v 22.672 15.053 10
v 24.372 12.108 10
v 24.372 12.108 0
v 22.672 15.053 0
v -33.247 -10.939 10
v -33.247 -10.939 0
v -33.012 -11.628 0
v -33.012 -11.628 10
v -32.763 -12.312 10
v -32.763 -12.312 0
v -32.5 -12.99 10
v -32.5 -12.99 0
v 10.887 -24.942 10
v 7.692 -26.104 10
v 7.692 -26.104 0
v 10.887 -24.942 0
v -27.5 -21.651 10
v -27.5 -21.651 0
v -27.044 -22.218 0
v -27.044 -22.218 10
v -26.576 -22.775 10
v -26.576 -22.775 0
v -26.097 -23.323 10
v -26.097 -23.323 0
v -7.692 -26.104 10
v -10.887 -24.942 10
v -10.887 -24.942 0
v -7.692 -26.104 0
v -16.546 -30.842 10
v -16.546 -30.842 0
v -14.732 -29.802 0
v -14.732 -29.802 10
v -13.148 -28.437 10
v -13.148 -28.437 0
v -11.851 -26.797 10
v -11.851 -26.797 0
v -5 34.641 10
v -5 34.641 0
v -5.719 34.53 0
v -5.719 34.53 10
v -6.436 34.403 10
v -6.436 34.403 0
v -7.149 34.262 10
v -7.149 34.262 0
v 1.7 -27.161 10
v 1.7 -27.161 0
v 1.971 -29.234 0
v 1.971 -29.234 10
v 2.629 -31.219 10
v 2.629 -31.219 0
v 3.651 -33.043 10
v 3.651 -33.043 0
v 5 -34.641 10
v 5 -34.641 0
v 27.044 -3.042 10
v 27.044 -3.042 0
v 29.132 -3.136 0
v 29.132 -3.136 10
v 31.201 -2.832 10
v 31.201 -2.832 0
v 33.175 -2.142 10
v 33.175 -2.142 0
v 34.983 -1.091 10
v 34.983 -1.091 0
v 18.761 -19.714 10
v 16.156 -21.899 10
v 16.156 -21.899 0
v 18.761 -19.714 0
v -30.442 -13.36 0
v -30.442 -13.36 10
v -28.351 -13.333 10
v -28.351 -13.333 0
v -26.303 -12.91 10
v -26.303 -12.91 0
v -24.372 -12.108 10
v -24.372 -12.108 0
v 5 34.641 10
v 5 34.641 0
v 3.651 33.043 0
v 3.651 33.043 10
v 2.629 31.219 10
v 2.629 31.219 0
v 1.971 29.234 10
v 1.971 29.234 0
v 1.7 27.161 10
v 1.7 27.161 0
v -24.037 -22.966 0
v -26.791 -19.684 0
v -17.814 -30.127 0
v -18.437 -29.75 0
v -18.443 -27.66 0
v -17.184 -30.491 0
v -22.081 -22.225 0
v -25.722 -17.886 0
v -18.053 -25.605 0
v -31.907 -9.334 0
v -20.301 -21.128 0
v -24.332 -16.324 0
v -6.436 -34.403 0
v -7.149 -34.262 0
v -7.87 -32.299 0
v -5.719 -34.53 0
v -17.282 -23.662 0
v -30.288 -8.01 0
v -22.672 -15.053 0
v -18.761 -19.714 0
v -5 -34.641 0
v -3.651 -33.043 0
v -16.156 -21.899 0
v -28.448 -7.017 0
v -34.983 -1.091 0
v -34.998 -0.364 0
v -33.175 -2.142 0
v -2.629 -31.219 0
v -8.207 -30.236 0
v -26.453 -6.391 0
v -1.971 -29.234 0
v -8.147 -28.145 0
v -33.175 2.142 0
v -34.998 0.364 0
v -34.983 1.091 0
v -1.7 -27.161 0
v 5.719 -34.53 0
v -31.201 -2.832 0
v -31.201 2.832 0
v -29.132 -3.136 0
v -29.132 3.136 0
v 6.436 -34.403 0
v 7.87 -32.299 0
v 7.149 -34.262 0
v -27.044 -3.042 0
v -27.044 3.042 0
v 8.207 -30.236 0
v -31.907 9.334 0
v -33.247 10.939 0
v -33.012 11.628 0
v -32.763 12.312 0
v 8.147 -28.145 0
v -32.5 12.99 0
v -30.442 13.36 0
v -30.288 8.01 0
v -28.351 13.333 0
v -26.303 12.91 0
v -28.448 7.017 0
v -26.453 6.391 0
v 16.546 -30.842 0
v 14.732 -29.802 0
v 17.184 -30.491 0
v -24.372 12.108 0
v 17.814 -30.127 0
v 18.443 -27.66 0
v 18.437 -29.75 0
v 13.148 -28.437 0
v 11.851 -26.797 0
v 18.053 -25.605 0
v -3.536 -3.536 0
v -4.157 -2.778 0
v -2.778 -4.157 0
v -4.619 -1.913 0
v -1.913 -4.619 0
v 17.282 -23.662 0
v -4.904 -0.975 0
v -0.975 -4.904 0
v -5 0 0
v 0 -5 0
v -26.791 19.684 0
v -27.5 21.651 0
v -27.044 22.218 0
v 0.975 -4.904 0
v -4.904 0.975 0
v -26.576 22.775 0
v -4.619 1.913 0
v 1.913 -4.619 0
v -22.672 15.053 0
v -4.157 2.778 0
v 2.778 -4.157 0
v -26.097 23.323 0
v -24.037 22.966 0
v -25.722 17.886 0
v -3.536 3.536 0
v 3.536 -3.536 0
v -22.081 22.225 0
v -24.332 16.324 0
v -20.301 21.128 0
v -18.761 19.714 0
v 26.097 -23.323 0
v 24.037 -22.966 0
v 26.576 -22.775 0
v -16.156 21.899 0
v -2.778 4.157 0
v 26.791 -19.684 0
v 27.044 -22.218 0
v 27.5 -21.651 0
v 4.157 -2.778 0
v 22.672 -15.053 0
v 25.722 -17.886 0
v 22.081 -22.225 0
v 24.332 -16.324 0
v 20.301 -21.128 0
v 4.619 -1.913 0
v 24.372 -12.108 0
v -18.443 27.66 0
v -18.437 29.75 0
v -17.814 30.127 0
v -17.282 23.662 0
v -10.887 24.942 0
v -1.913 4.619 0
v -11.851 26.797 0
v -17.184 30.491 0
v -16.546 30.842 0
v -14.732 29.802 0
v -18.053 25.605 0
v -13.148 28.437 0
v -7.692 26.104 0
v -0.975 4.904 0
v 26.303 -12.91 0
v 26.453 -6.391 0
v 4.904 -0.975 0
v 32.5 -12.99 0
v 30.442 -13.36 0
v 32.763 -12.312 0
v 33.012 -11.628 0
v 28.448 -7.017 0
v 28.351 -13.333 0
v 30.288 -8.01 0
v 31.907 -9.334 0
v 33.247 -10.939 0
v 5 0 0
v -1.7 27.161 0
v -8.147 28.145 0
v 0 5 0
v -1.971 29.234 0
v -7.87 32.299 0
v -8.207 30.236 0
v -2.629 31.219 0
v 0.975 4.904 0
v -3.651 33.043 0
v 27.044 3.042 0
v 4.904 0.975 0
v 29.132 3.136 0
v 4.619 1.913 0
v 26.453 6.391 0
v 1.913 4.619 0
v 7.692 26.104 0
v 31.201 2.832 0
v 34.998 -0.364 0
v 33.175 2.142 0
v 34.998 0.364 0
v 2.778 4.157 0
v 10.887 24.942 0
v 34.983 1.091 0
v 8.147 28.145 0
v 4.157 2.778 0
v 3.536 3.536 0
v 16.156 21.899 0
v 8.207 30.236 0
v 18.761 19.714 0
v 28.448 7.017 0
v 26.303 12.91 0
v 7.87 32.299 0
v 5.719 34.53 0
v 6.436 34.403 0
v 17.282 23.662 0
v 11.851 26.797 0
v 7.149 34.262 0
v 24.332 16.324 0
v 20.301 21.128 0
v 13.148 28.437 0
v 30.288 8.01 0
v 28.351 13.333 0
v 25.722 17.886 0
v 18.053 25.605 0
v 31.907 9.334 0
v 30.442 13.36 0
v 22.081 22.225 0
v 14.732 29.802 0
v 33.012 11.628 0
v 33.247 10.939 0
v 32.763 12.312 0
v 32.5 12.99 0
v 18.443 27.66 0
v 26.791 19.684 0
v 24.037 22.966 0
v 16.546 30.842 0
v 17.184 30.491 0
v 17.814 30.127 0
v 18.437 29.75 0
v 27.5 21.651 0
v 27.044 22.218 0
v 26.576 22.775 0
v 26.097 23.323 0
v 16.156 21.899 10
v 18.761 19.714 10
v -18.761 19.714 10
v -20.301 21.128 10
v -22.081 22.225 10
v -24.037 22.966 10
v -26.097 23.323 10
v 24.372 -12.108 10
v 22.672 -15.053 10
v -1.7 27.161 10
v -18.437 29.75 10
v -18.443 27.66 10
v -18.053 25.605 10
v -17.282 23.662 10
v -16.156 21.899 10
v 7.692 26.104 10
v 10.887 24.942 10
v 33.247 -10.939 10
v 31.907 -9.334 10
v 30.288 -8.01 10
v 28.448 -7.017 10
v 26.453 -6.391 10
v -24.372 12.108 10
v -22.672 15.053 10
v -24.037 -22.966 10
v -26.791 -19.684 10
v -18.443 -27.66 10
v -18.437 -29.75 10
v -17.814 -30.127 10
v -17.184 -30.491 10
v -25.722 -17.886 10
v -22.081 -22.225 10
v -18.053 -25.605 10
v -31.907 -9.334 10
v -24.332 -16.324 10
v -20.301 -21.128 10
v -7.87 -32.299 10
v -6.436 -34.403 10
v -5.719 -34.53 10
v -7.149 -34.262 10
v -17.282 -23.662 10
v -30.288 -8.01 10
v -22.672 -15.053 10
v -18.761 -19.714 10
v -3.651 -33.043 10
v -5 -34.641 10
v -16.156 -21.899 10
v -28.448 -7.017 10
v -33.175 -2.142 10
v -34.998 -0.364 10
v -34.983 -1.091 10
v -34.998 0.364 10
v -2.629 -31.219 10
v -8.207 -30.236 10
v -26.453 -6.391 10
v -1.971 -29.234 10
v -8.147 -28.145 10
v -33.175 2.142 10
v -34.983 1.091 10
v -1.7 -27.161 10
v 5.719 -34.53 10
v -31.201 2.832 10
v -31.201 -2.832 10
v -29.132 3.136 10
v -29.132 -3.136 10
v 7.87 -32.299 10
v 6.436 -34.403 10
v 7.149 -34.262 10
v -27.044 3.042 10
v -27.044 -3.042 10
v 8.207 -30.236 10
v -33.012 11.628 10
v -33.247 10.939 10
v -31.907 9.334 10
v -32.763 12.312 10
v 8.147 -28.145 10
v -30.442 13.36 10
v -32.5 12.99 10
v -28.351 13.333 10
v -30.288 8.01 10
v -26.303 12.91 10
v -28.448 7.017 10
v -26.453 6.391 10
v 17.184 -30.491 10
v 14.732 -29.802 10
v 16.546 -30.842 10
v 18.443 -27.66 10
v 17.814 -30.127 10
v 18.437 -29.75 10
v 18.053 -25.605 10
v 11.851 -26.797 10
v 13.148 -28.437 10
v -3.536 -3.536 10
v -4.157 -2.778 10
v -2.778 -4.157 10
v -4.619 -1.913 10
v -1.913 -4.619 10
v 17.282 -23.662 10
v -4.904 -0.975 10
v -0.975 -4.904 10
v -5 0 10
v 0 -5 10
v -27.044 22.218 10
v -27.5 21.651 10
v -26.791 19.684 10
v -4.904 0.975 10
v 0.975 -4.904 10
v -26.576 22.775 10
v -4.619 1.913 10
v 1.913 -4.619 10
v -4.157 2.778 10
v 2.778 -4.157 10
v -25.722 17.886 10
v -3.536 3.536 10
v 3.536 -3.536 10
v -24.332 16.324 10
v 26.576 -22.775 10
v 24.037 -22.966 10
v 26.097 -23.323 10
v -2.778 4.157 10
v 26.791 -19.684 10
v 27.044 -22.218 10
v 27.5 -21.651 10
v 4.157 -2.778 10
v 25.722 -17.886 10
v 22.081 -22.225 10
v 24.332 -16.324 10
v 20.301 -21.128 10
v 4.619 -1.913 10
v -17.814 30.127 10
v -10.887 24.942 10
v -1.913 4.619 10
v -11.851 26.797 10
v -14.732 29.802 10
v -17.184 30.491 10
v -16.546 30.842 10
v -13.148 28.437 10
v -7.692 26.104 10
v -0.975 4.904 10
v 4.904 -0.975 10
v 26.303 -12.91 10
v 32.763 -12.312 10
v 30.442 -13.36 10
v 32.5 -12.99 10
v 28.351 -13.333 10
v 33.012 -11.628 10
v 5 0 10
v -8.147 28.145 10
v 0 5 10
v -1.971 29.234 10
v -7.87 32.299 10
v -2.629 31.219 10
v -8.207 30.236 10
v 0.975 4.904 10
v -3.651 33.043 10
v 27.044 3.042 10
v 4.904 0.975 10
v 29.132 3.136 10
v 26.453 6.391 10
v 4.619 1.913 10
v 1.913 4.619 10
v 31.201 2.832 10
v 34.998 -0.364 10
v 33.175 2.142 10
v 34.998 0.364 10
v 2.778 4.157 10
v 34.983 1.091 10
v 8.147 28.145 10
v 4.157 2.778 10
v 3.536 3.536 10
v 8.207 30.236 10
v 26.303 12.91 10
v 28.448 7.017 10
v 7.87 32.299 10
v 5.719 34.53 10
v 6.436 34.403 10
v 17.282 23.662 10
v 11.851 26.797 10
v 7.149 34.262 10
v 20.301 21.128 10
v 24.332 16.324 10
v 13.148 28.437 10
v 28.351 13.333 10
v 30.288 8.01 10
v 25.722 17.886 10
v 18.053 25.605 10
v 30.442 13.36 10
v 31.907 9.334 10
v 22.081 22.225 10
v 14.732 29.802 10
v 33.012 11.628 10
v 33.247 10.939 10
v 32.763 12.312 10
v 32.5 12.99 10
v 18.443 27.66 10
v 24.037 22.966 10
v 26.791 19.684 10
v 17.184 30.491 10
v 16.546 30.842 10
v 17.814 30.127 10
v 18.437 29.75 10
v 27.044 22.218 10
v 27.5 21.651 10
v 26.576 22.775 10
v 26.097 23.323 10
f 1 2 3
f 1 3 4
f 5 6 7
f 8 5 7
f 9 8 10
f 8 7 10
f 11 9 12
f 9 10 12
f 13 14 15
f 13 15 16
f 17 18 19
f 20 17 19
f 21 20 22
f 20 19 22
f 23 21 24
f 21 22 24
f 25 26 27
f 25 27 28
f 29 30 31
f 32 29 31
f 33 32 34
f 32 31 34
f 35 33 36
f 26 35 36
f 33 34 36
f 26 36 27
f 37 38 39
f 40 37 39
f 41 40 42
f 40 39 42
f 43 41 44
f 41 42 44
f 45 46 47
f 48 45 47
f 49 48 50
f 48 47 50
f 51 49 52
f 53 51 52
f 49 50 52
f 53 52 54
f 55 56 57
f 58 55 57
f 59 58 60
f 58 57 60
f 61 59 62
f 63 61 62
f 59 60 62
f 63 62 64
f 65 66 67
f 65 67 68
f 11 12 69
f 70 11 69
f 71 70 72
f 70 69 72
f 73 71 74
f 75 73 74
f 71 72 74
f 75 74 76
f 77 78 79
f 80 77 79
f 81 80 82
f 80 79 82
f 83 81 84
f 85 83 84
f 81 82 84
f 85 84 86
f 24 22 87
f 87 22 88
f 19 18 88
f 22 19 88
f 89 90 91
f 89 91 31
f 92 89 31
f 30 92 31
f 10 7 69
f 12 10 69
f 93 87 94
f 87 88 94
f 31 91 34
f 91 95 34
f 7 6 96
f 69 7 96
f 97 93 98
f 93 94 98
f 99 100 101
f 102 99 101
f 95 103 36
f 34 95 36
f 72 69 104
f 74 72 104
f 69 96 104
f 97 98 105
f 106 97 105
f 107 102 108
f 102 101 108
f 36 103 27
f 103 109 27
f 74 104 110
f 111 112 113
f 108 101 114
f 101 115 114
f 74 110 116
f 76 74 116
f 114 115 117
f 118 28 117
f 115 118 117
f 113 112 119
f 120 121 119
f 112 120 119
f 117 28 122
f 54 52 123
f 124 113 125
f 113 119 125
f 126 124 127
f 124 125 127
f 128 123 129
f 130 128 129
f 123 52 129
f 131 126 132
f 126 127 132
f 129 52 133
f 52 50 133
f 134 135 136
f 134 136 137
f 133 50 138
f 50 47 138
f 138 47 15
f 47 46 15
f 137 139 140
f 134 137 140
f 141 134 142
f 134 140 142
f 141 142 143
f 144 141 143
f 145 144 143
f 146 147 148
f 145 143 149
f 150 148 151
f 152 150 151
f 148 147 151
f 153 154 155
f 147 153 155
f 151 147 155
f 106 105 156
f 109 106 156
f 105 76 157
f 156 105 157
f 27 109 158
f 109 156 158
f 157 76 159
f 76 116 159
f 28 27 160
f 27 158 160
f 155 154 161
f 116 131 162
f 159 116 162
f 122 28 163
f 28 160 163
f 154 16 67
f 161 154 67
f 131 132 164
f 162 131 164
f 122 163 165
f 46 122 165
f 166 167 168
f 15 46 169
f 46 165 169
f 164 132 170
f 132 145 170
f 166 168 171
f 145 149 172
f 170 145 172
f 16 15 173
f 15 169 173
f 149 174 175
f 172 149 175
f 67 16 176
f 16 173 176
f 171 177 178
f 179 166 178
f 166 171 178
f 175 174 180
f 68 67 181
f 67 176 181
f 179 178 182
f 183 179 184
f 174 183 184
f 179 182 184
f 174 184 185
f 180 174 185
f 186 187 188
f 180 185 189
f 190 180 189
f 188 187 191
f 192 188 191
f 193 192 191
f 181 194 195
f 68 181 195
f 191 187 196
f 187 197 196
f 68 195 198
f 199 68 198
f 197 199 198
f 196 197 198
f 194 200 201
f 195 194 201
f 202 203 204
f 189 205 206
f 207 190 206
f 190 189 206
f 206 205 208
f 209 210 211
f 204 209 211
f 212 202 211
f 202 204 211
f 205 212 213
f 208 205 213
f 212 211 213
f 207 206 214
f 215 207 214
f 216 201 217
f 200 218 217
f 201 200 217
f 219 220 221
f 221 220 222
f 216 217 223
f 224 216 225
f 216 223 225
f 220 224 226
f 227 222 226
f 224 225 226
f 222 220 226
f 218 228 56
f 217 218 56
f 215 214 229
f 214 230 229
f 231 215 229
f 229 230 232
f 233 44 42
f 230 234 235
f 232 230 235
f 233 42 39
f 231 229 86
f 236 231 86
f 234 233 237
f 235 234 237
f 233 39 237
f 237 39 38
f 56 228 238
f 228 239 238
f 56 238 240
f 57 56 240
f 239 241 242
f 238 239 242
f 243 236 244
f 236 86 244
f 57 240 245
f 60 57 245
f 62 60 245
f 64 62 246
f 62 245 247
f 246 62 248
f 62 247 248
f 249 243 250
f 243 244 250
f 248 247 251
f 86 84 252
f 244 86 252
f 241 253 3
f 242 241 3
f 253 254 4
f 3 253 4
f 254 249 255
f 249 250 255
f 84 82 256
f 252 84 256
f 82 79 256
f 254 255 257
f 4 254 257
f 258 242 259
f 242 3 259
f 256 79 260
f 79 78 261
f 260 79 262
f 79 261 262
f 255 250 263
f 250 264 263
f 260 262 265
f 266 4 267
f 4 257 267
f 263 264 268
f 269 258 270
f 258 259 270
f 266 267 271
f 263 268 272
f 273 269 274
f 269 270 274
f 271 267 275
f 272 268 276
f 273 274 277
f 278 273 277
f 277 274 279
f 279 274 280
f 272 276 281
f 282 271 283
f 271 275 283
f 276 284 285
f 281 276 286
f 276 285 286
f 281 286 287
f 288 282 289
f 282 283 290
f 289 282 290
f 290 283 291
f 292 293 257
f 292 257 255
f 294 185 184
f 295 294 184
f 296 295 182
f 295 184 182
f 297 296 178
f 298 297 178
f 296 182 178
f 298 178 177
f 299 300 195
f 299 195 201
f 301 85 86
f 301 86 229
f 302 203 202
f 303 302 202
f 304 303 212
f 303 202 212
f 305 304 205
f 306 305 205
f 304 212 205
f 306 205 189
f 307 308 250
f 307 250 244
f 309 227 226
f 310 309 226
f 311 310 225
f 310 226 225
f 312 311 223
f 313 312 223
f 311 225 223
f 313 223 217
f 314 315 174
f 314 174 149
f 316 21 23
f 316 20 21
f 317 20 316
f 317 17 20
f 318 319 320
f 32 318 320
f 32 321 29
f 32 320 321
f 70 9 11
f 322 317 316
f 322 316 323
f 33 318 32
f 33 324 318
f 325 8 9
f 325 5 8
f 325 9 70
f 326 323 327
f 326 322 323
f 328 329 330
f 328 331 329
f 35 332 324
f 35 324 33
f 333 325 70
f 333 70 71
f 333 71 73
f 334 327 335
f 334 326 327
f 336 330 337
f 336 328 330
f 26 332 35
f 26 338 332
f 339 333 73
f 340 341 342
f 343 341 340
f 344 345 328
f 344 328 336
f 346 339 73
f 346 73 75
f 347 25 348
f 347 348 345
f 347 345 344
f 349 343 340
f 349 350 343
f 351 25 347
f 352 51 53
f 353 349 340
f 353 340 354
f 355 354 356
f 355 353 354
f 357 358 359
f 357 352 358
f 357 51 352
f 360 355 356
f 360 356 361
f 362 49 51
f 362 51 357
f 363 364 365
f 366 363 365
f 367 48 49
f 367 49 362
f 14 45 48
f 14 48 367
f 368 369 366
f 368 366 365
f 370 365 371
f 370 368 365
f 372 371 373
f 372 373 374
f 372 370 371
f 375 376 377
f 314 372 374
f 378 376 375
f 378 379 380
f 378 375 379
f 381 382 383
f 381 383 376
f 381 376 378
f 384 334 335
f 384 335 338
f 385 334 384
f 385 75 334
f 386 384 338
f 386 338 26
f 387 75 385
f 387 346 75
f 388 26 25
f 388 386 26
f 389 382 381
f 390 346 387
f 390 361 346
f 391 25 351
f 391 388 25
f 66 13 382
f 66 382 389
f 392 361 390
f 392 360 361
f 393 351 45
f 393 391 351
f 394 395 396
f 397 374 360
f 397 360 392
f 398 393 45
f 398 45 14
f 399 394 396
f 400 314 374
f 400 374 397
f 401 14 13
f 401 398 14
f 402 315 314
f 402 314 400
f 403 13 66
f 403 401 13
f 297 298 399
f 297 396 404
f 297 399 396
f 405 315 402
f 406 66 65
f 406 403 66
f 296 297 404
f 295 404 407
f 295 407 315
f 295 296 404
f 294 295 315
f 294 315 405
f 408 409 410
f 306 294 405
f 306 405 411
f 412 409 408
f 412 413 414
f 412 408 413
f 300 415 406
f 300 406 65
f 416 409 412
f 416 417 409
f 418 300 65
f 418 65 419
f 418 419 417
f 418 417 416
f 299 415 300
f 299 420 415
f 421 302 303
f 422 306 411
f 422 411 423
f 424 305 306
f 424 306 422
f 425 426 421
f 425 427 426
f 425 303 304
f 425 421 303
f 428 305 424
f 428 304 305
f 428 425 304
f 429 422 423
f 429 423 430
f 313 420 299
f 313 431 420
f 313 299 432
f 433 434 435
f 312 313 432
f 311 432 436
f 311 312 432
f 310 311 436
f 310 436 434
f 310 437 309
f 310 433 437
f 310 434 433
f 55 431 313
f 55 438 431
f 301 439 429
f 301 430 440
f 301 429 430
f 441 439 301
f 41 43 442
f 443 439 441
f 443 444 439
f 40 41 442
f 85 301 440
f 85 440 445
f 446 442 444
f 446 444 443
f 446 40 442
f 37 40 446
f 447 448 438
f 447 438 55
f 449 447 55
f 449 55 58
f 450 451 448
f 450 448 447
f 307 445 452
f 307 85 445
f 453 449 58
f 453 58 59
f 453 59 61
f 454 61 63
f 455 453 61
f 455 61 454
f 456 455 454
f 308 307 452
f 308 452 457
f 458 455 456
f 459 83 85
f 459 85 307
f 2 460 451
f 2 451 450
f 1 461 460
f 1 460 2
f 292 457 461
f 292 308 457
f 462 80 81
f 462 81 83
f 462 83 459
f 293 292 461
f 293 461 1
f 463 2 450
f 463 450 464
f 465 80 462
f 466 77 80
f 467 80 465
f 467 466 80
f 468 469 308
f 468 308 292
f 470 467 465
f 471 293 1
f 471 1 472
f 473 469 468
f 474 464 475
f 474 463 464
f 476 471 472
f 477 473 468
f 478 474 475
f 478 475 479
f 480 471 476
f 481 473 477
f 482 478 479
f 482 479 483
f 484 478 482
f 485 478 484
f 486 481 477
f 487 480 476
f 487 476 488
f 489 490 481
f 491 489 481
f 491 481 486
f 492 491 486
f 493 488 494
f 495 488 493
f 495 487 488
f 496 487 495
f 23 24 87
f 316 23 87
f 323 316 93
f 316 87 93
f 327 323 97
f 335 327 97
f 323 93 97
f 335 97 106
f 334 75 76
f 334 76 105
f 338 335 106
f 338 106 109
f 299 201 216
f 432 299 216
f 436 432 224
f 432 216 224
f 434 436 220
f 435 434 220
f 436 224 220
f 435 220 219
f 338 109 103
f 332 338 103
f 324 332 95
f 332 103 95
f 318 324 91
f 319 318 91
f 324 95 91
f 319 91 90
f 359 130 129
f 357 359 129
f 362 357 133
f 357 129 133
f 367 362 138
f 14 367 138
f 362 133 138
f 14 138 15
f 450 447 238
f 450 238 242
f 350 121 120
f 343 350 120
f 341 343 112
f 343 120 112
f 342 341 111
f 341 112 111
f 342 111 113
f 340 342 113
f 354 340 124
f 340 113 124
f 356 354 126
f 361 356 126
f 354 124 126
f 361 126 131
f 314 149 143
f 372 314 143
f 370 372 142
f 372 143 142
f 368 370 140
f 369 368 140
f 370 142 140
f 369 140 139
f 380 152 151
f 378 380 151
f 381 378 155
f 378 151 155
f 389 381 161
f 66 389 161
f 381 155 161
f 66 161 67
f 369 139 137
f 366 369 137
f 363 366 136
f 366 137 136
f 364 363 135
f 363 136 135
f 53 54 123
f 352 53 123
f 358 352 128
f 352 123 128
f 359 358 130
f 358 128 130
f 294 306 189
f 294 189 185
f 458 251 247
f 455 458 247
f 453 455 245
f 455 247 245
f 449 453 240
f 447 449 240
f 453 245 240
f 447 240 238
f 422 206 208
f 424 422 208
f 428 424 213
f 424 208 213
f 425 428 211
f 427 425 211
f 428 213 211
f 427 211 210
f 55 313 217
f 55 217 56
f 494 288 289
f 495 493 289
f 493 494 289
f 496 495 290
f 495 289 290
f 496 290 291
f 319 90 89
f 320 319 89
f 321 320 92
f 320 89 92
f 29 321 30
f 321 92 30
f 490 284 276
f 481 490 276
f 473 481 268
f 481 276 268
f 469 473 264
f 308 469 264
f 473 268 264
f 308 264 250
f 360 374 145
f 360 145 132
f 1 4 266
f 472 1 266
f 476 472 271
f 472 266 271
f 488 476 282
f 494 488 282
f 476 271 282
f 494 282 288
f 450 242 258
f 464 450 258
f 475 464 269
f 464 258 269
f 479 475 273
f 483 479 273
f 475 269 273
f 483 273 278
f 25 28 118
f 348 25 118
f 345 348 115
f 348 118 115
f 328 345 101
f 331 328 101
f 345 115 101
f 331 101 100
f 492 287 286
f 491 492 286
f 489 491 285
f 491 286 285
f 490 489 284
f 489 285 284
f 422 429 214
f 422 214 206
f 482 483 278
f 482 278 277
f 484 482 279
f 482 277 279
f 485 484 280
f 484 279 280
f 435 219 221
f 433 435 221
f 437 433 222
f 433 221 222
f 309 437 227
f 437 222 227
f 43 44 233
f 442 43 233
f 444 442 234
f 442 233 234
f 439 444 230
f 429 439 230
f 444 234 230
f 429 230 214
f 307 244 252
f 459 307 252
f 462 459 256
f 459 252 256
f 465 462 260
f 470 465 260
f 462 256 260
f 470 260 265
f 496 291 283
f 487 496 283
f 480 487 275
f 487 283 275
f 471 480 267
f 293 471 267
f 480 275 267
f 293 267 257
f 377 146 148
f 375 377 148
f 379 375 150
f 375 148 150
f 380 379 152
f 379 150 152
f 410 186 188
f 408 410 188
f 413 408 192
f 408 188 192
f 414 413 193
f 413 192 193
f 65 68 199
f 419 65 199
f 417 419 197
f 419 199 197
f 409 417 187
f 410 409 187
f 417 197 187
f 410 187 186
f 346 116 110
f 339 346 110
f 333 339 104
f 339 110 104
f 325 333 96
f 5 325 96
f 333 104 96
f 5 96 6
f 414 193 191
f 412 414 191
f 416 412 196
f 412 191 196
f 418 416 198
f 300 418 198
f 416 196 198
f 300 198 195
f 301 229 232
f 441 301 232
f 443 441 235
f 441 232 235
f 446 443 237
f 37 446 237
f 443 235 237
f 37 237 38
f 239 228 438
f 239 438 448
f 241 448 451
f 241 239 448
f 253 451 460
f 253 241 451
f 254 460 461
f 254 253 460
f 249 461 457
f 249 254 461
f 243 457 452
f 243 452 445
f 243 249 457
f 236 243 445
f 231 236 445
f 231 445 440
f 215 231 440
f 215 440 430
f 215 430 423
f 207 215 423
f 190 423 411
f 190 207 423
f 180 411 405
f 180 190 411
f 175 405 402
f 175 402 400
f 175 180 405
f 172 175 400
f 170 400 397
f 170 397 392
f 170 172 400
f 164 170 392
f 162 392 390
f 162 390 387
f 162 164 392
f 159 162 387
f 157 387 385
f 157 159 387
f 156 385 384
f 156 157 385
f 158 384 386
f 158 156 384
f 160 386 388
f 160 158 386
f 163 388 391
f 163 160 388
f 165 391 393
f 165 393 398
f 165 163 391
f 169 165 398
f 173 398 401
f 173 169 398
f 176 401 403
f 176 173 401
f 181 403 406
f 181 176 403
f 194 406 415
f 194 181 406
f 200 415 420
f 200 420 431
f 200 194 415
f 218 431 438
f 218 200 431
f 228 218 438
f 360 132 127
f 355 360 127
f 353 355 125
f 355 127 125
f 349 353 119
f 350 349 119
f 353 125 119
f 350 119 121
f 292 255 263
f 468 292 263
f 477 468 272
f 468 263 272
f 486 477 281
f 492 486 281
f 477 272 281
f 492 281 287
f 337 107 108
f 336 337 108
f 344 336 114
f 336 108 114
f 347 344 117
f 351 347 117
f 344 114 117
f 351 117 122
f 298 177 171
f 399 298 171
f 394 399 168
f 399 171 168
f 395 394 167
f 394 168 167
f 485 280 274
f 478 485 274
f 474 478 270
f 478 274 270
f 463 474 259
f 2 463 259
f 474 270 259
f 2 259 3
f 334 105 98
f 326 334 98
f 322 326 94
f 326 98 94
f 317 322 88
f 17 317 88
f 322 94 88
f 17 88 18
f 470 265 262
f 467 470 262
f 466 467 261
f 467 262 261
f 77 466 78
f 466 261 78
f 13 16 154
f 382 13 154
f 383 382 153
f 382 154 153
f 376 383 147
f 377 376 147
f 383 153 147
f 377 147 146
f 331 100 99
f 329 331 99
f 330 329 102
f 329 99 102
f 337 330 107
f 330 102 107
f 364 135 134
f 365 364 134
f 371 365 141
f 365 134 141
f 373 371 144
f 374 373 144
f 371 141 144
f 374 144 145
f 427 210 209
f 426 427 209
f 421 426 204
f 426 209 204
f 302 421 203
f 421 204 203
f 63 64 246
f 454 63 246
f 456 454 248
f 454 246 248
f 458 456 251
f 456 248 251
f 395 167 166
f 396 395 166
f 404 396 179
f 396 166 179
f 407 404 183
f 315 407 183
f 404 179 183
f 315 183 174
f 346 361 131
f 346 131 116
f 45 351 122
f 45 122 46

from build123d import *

# Parameters (mm, degrees)
SKETCH1_R           = 35
BOSS_EXTRUDE1_DEPTH = 10
CUT_EXTRUDE1_DEPTH  = 10
CIRPATTERN1_COUNT   = 18
SKETCH3_R           = 5
CUT_EXTRUDE2_DEPTH  = 10


with BuildPart() as part:
    # Sketch1 → Boss-Extrude1 (new body)
    with BuildSketch(Plane.XY):
        Circle(SKETCH1_R)
    extrude(amount=BOSS_EXTRUDE1_DEPTH)

    # Sketch2 → Cut-Extrude1 (cut)
    with BuildSketch(Plane.XY):
        with BuildLine():
            Line((0, 27.161016151), (-1.7, 27.161016151))
            ThreePointArc((-1.7, 27.161016151), (-2.629181754, 31.219024201), (-5, 34.641016151))
            ThreePointArc((-5, 34.641016151), (-2.962634917, 36.808842577), (0, 37.07925382))
            ThreePointArc((0, 37.07925382), (2.962634917, 36.808842577), (5, 34.641016151))
            ThreePointArc((5, 34.641016151), (2.629181754, 31.219024201), (1.7, 27.161016151))
            Line((1.7, 27.161016151), (0, 27.161016151))
        make_face()
    cut_extrude1 = extrude(amount=CUT_EXTRUDE1_DEPTH, mode=Mode.SUBTRACT)

    # CirPattern1: Cut-Extrude1 ×18 about axis
    cirpattern1_axis = Axis((0, 0, 0), (0, 0, 1))
    for i in range(1, CIRPATTERN1_COUNT):
        add(cut_extrude1.rotate(cirpattern1_axis, i * 360 / CIRPATTERN1_COUNT), mode=Mode.SUBTRACT)

    # Sketch3 → Cut-Extrude2 (cut)
    with BuildSketch(Plane.XY):
        Circle(SKETCH3_R)
    extrude(amount=CUT_EXTRUDE2_DEPTH, mode=Mode.SUBTRACT)


solid = part.part
